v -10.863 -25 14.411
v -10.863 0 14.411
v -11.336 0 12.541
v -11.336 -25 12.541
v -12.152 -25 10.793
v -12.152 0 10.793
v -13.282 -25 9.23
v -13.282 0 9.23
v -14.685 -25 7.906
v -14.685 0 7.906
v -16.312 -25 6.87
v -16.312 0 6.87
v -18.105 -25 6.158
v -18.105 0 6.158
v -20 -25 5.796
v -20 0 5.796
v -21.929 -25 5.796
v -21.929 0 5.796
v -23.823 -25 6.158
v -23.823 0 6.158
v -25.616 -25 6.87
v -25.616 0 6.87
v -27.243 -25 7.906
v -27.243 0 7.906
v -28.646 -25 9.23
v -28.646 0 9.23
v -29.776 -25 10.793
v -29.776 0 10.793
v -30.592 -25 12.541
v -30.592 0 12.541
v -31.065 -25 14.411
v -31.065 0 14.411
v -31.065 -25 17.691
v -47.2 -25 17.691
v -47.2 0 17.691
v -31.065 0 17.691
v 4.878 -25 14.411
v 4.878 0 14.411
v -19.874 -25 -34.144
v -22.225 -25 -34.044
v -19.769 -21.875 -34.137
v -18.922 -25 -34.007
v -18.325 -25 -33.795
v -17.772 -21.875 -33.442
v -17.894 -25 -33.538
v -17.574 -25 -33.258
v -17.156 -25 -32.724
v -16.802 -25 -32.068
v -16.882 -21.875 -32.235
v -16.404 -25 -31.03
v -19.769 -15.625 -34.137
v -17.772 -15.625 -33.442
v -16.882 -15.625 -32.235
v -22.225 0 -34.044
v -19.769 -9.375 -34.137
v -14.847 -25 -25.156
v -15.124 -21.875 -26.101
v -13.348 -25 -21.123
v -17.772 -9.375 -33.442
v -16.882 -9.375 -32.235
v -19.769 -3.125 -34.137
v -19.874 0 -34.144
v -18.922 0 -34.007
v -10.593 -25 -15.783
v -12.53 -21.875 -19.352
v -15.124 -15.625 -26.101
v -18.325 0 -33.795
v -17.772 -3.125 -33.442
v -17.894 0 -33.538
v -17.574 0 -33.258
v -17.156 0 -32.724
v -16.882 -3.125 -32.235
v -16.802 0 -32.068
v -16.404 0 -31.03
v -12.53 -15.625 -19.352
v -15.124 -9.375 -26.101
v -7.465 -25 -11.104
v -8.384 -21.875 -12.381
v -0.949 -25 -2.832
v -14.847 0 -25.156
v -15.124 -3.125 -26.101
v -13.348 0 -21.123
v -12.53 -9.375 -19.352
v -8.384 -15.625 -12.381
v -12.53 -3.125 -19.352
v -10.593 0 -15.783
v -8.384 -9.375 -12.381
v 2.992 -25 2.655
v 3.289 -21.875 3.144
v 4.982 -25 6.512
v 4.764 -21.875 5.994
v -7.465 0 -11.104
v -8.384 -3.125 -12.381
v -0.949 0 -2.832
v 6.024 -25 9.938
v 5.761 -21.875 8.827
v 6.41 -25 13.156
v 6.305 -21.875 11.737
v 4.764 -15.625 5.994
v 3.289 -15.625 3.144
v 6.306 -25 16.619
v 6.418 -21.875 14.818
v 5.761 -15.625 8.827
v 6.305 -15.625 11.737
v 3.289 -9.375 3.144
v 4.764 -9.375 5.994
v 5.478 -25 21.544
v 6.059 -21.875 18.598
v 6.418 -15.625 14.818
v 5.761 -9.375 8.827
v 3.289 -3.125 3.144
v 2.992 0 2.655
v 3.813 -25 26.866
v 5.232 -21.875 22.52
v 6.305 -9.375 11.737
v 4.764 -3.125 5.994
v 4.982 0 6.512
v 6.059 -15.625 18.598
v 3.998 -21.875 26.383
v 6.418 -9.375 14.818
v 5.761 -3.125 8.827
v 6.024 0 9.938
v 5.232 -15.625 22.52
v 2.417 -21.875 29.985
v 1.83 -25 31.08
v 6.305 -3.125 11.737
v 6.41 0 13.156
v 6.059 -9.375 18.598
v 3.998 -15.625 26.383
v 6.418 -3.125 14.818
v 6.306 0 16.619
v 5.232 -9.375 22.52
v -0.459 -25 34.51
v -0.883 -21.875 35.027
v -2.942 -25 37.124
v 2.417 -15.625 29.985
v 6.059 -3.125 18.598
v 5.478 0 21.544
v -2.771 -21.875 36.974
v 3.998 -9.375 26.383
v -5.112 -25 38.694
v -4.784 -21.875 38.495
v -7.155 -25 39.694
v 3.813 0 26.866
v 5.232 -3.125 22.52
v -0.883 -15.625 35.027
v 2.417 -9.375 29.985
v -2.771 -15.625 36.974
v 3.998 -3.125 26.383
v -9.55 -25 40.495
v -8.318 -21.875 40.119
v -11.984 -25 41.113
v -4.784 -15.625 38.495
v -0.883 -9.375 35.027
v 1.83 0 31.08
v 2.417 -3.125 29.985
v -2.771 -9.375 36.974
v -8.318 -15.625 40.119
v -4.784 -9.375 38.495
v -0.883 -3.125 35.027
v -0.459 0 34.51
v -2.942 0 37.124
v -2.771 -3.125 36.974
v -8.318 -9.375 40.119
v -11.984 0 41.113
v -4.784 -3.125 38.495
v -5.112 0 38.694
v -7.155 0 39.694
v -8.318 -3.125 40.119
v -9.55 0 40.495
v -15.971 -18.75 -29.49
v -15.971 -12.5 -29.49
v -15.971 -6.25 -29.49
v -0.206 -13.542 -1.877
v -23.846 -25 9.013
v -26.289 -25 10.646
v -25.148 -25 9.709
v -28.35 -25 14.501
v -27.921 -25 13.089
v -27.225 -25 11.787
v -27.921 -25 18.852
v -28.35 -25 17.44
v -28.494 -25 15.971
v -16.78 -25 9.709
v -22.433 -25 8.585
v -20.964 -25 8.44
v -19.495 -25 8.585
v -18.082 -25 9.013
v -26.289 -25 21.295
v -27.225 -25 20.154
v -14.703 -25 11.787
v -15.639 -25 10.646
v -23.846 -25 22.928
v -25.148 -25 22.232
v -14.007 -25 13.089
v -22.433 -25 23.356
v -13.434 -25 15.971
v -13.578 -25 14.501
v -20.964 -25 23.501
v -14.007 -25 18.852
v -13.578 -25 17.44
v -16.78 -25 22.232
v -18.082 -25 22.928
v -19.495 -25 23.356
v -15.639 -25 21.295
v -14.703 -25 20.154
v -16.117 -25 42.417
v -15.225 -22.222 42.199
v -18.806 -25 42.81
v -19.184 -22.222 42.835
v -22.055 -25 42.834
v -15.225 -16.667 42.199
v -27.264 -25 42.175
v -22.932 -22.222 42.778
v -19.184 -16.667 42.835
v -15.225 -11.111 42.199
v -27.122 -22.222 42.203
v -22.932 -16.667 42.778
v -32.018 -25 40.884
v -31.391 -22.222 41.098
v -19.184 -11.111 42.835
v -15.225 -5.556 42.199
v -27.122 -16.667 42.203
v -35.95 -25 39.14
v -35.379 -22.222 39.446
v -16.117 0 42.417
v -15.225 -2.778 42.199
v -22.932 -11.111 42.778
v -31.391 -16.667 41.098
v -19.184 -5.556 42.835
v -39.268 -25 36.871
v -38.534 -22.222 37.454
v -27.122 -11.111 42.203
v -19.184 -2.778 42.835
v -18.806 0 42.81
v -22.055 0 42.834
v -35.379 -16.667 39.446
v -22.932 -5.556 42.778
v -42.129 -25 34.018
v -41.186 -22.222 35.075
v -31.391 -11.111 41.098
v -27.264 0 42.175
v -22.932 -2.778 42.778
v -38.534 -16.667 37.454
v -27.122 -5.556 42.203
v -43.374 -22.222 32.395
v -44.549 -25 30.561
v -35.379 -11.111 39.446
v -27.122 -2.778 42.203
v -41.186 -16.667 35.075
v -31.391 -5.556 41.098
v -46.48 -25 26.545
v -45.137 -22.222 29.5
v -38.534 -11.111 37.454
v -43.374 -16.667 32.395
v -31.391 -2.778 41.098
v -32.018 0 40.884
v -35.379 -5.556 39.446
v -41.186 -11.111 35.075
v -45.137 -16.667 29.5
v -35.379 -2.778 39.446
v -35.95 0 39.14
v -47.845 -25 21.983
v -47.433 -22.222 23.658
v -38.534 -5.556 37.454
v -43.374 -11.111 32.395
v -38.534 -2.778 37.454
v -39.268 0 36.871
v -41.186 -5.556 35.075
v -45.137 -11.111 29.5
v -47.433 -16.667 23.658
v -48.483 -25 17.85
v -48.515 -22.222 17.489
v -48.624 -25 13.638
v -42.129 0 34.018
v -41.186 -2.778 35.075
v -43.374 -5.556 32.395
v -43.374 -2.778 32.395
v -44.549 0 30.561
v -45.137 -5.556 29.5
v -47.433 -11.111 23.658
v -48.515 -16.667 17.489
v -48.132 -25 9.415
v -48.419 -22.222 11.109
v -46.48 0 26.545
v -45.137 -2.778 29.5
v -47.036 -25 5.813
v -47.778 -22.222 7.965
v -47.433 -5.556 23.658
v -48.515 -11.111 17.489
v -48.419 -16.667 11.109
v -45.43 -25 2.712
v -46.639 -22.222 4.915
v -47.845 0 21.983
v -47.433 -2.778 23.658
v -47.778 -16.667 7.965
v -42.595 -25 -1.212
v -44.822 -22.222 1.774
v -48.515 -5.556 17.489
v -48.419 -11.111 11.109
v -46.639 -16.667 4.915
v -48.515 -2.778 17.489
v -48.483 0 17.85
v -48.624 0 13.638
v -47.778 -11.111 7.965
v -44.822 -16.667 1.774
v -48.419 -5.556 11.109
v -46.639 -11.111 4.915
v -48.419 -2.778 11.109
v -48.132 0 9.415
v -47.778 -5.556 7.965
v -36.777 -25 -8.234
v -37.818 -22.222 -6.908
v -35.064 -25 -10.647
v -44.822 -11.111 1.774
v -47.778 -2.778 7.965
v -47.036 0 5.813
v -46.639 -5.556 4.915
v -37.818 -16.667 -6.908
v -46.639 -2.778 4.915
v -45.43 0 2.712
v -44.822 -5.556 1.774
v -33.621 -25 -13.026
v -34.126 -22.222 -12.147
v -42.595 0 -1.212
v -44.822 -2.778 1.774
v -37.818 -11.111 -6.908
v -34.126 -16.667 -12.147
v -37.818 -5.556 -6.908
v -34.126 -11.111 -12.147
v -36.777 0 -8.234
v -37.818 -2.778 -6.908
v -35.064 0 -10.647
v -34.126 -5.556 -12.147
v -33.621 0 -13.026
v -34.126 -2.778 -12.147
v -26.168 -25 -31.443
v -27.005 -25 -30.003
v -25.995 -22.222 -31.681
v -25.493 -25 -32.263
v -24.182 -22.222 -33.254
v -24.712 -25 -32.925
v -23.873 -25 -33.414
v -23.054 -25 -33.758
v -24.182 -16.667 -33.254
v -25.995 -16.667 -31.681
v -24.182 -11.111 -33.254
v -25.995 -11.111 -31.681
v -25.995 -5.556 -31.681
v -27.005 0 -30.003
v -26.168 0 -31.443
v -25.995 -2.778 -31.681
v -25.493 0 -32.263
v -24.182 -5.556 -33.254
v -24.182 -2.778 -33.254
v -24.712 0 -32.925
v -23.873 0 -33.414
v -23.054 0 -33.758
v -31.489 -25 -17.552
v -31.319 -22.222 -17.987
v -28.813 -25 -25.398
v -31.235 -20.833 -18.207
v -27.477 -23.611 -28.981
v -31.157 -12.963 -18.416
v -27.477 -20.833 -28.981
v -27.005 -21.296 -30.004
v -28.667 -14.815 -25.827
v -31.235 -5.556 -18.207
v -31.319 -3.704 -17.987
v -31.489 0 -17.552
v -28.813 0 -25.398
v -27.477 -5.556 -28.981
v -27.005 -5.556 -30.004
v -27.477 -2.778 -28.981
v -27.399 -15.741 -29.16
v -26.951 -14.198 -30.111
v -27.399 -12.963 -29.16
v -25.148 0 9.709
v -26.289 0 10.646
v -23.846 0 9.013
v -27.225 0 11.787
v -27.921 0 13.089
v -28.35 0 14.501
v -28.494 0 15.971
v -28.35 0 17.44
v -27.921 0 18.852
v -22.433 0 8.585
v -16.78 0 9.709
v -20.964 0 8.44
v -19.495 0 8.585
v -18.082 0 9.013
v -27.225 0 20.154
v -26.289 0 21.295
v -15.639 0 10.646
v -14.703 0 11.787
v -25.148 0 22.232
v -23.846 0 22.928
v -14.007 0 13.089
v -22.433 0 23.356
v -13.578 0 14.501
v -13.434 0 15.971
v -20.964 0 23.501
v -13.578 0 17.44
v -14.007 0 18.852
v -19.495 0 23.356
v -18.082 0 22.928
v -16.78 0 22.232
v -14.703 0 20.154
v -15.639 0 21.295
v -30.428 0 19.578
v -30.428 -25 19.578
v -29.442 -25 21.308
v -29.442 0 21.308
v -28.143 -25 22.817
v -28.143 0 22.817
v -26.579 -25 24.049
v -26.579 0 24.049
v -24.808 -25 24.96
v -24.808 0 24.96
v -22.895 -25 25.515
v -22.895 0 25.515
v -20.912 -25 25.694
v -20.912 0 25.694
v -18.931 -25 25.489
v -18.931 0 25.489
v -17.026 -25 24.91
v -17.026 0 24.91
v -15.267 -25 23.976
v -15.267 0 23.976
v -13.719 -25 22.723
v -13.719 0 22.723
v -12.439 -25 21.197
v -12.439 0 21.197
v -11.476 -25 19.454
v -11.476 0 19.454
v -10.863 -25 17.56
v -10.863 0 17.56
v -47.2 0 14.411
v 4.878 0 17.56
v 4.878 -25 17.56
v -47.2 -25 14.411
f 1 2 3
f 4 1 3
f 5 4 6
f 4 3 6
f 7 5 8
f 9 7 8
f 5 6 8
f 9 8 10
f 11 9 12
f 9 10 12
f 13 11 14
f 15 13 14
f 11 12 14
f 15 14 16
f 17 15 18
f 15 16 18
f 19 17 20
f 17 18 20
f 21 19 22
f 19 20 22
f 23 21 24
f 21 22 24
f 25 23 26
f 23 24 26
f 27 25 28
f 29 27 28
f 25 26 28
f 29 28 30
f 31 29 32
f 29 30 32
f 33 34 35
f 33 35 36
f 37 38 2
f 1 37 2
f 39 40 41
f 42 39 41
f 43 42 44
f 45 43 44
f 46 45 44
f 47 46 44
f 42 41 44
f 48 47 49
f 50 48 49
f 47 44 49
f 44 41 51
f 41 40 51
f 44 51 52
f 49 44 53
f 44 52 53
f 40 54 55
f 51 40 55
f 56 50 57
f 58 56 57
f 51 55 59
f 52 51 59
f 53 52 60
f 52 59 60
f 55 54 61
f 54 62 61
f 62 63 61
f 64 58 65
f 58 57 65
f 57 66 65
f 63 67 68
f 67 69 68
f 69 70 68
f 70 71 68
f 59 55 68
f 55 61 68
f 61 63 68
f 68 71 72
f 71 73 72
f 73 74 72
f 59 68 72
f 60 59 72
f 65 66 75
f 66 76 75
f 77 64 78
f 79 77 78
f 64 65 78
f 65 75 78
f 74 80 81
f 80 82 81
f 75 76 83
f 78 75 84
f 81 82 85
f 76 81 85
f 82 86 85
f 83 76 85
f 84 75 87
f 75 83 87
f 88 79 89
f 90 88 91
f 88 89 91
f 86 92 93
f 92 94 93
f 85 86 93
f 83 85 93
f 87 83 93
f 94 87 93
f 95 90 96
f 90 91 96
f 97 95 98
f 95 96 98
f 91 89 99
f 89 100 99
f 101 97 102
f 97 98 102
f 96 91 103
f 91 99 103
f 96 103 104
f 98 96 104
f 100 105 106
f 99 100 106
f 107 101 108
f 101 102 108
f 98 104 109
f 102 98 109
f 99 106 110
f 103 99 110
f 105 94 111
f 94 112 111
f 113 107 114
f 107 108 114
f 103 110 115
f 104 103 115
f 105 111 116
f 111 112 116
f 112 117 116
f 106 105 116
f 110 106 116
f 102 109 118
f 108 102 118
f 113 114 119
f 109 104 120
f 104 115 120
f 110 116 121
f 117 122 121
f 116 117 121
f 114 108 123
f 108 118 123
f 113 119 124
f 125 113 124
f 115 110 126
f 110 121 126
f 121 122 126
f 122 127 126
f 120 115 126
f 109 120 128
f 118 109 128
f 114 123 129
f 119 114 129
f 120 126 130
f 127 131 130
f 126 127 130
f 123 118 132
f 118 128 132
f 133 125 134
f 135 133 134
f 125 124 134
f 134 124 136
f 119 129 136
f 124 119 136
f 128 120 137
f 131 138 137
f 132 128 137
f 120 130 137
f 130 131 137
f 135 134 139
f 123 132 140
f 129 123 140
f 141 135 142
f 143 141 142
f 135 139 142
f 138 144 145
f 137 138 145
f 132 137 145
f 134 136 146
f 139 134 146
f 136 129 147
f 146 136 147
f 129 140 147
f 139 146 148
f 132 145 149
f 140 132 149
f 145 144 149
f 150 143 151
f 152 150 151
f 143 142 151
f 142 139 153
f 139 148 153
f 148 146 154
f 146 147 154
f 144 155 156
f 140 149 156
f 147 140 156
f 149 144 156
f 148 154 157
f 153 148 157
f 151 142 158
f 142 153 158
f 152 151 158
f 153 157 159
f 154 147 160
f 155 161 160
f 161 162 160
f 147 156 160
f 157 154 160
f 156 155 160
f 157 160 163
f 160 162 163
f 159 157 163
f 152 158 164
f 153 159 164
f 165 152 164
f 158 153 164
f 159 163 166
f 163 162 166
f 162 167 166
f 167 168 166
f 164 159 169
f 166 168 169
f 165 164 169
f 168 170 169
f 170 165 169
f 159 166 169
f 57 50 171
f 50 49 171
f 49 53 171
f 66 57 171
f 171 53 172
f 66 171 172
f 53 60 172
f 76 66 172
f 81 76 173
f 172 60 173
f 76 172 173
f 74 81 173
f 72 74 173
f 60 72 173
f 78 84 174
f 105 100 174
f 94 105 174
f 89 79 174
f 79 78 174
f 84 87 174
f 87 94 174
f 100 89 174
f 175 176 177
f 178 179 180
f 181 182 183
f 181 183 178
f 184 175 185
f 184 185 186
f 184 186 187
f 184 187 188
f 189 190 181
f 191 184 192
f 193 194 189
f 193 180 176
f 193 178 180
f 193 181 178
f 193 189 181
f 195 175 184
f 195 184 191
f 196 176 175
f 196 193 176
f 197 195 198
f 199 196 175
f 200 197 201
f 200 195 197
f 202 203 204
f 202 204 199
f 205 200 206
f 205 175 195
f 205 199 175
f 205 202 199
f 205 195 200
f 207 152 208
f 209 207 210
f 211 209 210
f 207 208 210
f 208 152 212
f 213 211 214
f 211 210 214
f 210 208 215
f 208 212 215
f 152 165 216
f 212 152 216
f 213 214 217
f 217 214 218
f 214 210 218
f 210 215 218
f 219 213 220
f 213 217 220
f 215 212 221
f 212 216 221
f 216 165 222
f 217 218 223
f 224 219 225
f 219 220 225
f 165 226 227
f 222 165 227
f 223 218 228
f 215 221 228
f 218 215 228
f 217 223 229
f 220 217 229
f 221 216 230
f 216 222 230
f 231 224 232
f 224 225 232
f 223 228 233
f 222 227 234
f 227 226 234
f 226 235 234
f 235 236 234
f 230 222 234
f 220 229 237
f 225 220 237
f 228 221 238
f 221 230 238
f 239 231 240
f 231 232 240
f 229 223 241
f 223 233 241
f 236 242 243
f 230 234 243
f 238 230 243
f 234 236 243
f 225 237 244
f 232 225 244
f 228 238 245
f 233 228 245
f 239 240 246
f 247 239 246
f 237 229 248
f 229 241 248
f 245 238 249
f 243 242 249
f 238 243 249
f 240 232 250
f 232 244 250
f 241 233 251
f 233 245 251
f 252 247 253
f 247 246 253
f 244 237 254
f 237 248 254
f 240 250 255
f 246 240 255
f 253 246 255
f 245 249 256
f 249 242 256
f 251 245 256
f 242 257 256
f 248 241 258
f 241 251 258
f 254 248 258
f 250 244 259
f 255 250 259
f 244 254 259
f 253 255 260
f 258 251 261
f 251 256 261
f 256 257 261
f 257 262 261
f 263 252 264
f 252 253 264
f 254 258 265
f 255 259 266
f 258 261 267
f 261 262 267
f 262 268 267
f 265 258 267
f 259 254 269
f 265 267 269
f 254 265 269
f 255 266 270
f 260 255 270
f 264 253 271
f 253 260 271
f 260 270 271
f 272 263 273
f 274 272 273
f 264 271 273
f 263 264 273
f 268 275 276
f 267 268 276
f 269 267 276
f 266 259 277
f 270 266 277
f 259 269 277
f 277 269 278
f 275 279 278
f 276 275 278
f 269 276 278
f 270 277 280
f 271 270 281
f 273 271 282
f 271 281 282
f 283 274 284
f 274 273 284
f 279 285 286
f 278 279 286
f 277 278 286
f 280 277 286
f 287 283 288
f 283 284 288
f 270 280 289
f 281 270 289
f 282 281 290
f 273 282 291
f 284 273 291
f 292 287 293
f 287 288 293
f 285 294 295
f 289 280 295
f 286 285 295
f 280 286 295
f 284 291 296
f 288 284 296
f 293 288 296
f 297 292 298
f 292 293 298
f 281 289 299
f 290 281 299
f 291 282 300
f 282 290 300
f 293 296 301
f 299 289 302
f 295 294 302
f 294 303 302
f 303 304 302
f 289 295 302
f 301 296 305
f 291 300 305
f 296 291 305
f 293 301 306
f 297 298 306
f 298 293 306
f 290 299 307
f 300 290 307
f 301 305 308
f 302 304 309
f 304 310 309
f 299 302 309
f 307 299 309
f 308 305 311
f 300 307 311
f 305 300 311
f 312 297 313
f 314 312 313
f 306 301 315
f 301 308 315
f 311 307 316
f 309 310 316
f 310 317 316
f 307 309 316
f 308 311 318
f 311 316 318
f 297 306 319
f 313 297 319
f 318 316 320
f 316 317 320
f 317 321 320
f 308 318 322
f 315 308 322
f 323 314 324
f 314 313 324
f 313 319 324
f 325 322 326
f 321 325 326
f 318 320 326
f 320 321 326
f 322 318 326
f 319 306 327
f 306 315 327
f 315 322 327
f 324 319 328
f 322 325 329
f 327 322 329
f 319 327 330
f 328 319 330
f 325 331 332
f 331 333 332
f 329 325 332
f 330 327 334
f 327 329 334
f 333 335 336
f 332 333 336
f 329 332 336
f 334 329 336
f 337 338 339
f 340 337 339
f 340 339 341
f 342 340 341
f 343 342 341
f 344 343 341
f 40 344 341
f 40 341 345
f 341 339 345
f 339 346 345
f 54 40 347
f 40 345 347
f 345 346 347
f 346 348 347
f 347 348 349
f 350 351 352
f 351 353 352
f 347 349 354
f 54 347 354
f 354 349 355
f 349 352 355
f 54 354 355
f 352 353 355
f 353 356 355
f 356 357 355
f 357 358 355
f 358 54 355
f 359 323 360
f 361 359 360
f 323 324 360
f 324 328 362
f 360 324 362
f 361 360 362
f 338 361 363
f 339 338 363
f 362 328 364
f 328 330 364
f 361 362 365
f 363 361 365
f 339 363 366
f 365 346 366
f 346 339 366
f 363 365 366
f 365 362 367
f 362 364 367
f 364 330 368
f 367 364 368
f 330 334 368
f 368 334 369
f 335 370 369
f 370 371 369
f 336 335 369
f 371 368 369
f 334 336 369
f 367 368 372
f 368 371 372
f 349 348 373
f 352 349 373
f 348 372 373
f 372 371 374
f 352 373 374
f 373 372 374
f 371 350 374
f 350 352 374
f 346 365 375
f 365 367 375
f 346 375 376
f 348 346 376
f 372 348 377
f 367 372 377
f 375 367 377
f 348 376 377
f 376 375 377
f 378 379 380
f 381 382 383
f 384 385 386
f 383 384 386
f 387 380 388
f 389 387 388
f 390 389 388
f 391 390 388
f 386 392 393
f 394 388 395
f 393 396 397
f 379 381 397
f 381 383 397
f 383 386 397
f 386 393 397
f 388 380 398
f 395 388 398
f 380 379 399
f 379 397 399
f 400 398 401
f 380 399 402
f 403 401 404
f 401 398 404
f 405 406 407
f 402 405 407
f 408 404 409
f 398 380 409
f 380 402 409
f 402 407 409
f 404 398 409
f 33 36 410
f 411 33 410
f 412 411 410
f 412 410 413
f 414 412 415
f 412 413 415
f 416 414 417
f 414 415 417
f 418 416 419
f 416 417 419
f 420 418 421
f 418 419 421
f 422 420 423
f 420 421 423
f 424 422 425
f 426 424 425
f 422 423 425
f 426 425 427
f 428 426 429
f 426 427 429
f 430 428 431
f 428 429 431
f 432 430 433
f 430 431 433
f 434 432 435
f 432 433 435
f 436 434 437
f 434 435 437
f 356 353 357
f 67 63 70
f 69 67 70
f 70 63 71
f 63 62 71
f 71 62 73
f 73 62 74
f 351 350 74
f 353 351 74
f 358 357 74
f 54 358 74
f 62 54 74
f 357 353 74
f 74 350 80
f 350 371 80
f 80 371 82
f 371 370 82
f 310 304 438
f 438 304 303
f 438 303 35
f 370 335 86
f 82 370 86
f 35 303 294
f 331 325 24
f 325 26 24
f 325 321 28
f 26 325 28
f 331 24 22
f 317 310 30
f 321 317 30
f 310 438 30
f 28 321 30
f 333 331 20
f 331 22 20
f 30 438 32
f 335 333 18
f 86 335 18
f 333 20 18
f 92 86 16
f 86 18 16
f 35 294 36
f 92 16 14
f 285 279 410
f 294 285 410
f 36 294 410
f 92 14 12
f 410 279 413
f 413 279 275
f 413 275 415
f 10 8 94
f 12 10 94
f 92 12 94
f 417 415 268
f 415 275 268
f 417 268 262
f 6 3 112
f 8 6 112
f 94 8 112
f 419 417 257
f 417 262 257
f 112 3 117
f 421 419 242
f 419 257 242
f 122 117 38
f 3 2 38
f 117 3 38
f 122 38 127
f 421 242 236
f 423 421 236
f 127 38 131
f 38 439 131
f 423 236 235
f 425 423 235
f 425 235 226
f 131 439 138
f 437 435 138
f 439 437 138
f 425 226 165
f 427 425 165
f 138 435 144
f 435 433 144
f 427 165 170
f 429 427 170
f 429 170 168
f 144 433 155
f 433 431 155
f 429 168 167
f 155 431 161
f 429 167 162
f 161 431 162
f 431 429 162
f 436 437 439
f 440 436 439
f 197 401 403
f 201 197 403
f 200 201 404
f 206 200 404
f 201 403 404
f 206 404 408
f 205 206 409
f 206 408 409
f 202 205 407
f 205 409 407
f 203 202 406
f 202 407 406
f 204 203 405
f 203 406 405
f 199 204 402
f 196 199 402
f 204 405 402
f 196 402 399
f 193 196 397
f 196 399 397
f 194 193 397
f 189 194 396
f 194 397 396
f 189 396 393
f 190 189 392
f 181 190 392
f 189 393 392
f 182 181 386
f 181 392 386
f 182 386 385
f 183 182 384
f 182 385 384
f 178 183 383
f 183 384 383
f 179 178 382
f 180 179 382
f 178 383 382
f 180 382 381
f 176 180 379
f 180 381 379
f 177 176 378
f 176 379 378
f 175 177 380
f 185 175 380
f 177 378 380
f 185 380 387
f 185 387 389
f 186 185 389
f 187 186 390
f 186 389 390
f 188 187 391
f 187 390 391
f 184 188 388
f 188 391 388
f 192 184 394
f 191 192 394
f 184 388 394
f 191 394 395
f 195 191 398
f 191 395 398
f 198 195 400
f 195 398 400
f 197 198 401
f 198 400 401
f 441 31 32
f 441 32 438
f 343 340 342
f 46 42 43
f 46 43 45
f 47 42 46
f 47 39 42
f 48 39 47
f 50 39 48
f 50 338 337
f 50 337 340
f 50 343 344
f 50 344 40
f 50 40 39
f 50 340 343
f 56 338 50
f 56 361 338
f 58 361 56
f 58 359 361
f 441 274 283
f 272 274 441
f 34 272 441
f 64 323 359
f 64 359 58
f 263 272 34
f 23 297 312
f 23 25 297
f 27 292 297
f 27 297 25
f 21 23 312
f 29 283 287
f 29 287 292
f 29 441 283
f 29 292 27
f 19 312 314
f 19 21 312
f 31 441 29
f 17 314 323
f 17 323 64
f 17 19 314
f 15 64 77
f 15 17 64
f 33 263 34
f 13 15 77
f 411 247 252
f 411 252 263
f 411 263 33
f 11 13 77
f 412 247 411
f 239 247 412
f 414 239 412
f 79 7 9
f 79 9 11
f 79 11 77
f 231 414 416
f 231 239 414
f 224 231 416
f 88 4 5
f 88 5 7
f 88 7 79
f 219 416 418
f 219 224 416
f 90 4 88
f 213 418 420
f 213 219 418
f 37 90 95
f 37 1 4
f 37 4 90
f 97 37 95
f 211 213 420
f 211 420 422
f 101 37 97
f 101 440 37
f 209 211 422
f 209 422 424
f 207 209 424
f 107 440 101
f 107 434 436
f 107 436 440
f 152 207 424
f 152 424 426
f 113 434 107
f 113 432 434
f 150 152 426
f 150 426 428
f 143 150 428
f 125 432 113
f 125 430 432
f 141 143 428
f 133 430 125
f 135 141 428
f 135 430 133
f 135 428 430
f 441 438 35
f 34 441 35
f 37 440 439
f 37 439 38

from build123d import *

# Parameters (mm, degrees)
F1_DEPTH = 25
F0_R     = 7.5303682966


with BuildPart() as f1:
    # F0 (on Front) → F1 (new body)
    with BuildSketch(Plane.XZ):
        with BuildLine():
            add(Edge.make_bspline(
                [(-11.9837475941, 41.112869978), (-14.0644761705, 41.886695284), (-19.2557934458, 43.8173520381), (-36.54394953, 41.0291184883), (-46.0001070067, 30.0422302578), (-49.2205246293, 17.5763953256), (-48.1474036096, 4.2025256185), (-37.2110825678, -6.8545940824), (-30.7871102029, -17.1470942803), (-27.2498735968, -32.3723669291), (-23.5453352756, -33.604638441), (-22.2246721387, -34.0439416468)],
                knots=[0, 0, 0, 0, 0.0878062704, 0.2190724025, 0.3395366578, 0.4535266556, 0.5685909876, 0.6925343203, 0.8090503071, 0.9319266806, 1, 1, 1, 1], degree=3))
            add(Edge.make_bspline(
                [(-22.2246721387, -34.0439416468), (-20.536529393, -34.1938452236), (-16.6236175005, -34.5413036894), (-15.4966338341, -25.0211298075), (-9.1613017918, -11.8441221828), (4.3688343274, 2.4843501308), (7.6345553851, 14.6093654307), (3.4271549286, 30.3095753231), (-4.1001211686, 39.2136412169), (-9.5248784444, 40.520508702), (-11.9837475941, 41.112869978)],
                knots=[0, 0, 0, 0, 0.0791722469, 0.1835117482, 0.329537453, 0.4941485798, 0.6239938761, 0.7719211757, 0.8966191561, 1, 1, 1, 1], degree=3))
        make_face()
        with BuildLine():
            Line((-31.0648977757, 14.4113143906), (-47.1998937428, 14.4113143906))
            Line((-47.1998937428, 14.4113143906), (-47.1998937428, 17.6907852292))
            Line((-47.1998937428, 17.6907852292), (-31.0648977757, 17.6907852292))
            ThreePointArc((-31.0648977757, 17.6907852292), (-20.9117375341, 25.6935033247), (-10.8633618802, 17.5596047193))
            Line((-10.8633618802, 17.5596047193), (4.8780944198, 17.5596047193))
            Line((4.8780944198, 17.5596047193), (4.8780944198, 14.4113143906))
            Line((4.8780944198, 14.4113143906), (-10.8633618802, 14.4113143906))
            ThreePointArc((-10.8633618802, 14.4113143906), (-20.9641298279, 5.7501454983), (-31.0648977757, 14.4113143906))
        make_face(mode=Mode.SUBTRACT)
    extrude(amount=F1_DEPTH)


with BuildPart() as f1b:
    # F0 (on Front) → F1, piece 2 (new body)
    with BuildSketch(Plane.XZ):
        with Locations((-20.9641298279, 15.9705535008)):
            Circle(F0_R)
    extrude(amount=F1_DEPTH)


solid = Compound([f1.part, f1b.part])
